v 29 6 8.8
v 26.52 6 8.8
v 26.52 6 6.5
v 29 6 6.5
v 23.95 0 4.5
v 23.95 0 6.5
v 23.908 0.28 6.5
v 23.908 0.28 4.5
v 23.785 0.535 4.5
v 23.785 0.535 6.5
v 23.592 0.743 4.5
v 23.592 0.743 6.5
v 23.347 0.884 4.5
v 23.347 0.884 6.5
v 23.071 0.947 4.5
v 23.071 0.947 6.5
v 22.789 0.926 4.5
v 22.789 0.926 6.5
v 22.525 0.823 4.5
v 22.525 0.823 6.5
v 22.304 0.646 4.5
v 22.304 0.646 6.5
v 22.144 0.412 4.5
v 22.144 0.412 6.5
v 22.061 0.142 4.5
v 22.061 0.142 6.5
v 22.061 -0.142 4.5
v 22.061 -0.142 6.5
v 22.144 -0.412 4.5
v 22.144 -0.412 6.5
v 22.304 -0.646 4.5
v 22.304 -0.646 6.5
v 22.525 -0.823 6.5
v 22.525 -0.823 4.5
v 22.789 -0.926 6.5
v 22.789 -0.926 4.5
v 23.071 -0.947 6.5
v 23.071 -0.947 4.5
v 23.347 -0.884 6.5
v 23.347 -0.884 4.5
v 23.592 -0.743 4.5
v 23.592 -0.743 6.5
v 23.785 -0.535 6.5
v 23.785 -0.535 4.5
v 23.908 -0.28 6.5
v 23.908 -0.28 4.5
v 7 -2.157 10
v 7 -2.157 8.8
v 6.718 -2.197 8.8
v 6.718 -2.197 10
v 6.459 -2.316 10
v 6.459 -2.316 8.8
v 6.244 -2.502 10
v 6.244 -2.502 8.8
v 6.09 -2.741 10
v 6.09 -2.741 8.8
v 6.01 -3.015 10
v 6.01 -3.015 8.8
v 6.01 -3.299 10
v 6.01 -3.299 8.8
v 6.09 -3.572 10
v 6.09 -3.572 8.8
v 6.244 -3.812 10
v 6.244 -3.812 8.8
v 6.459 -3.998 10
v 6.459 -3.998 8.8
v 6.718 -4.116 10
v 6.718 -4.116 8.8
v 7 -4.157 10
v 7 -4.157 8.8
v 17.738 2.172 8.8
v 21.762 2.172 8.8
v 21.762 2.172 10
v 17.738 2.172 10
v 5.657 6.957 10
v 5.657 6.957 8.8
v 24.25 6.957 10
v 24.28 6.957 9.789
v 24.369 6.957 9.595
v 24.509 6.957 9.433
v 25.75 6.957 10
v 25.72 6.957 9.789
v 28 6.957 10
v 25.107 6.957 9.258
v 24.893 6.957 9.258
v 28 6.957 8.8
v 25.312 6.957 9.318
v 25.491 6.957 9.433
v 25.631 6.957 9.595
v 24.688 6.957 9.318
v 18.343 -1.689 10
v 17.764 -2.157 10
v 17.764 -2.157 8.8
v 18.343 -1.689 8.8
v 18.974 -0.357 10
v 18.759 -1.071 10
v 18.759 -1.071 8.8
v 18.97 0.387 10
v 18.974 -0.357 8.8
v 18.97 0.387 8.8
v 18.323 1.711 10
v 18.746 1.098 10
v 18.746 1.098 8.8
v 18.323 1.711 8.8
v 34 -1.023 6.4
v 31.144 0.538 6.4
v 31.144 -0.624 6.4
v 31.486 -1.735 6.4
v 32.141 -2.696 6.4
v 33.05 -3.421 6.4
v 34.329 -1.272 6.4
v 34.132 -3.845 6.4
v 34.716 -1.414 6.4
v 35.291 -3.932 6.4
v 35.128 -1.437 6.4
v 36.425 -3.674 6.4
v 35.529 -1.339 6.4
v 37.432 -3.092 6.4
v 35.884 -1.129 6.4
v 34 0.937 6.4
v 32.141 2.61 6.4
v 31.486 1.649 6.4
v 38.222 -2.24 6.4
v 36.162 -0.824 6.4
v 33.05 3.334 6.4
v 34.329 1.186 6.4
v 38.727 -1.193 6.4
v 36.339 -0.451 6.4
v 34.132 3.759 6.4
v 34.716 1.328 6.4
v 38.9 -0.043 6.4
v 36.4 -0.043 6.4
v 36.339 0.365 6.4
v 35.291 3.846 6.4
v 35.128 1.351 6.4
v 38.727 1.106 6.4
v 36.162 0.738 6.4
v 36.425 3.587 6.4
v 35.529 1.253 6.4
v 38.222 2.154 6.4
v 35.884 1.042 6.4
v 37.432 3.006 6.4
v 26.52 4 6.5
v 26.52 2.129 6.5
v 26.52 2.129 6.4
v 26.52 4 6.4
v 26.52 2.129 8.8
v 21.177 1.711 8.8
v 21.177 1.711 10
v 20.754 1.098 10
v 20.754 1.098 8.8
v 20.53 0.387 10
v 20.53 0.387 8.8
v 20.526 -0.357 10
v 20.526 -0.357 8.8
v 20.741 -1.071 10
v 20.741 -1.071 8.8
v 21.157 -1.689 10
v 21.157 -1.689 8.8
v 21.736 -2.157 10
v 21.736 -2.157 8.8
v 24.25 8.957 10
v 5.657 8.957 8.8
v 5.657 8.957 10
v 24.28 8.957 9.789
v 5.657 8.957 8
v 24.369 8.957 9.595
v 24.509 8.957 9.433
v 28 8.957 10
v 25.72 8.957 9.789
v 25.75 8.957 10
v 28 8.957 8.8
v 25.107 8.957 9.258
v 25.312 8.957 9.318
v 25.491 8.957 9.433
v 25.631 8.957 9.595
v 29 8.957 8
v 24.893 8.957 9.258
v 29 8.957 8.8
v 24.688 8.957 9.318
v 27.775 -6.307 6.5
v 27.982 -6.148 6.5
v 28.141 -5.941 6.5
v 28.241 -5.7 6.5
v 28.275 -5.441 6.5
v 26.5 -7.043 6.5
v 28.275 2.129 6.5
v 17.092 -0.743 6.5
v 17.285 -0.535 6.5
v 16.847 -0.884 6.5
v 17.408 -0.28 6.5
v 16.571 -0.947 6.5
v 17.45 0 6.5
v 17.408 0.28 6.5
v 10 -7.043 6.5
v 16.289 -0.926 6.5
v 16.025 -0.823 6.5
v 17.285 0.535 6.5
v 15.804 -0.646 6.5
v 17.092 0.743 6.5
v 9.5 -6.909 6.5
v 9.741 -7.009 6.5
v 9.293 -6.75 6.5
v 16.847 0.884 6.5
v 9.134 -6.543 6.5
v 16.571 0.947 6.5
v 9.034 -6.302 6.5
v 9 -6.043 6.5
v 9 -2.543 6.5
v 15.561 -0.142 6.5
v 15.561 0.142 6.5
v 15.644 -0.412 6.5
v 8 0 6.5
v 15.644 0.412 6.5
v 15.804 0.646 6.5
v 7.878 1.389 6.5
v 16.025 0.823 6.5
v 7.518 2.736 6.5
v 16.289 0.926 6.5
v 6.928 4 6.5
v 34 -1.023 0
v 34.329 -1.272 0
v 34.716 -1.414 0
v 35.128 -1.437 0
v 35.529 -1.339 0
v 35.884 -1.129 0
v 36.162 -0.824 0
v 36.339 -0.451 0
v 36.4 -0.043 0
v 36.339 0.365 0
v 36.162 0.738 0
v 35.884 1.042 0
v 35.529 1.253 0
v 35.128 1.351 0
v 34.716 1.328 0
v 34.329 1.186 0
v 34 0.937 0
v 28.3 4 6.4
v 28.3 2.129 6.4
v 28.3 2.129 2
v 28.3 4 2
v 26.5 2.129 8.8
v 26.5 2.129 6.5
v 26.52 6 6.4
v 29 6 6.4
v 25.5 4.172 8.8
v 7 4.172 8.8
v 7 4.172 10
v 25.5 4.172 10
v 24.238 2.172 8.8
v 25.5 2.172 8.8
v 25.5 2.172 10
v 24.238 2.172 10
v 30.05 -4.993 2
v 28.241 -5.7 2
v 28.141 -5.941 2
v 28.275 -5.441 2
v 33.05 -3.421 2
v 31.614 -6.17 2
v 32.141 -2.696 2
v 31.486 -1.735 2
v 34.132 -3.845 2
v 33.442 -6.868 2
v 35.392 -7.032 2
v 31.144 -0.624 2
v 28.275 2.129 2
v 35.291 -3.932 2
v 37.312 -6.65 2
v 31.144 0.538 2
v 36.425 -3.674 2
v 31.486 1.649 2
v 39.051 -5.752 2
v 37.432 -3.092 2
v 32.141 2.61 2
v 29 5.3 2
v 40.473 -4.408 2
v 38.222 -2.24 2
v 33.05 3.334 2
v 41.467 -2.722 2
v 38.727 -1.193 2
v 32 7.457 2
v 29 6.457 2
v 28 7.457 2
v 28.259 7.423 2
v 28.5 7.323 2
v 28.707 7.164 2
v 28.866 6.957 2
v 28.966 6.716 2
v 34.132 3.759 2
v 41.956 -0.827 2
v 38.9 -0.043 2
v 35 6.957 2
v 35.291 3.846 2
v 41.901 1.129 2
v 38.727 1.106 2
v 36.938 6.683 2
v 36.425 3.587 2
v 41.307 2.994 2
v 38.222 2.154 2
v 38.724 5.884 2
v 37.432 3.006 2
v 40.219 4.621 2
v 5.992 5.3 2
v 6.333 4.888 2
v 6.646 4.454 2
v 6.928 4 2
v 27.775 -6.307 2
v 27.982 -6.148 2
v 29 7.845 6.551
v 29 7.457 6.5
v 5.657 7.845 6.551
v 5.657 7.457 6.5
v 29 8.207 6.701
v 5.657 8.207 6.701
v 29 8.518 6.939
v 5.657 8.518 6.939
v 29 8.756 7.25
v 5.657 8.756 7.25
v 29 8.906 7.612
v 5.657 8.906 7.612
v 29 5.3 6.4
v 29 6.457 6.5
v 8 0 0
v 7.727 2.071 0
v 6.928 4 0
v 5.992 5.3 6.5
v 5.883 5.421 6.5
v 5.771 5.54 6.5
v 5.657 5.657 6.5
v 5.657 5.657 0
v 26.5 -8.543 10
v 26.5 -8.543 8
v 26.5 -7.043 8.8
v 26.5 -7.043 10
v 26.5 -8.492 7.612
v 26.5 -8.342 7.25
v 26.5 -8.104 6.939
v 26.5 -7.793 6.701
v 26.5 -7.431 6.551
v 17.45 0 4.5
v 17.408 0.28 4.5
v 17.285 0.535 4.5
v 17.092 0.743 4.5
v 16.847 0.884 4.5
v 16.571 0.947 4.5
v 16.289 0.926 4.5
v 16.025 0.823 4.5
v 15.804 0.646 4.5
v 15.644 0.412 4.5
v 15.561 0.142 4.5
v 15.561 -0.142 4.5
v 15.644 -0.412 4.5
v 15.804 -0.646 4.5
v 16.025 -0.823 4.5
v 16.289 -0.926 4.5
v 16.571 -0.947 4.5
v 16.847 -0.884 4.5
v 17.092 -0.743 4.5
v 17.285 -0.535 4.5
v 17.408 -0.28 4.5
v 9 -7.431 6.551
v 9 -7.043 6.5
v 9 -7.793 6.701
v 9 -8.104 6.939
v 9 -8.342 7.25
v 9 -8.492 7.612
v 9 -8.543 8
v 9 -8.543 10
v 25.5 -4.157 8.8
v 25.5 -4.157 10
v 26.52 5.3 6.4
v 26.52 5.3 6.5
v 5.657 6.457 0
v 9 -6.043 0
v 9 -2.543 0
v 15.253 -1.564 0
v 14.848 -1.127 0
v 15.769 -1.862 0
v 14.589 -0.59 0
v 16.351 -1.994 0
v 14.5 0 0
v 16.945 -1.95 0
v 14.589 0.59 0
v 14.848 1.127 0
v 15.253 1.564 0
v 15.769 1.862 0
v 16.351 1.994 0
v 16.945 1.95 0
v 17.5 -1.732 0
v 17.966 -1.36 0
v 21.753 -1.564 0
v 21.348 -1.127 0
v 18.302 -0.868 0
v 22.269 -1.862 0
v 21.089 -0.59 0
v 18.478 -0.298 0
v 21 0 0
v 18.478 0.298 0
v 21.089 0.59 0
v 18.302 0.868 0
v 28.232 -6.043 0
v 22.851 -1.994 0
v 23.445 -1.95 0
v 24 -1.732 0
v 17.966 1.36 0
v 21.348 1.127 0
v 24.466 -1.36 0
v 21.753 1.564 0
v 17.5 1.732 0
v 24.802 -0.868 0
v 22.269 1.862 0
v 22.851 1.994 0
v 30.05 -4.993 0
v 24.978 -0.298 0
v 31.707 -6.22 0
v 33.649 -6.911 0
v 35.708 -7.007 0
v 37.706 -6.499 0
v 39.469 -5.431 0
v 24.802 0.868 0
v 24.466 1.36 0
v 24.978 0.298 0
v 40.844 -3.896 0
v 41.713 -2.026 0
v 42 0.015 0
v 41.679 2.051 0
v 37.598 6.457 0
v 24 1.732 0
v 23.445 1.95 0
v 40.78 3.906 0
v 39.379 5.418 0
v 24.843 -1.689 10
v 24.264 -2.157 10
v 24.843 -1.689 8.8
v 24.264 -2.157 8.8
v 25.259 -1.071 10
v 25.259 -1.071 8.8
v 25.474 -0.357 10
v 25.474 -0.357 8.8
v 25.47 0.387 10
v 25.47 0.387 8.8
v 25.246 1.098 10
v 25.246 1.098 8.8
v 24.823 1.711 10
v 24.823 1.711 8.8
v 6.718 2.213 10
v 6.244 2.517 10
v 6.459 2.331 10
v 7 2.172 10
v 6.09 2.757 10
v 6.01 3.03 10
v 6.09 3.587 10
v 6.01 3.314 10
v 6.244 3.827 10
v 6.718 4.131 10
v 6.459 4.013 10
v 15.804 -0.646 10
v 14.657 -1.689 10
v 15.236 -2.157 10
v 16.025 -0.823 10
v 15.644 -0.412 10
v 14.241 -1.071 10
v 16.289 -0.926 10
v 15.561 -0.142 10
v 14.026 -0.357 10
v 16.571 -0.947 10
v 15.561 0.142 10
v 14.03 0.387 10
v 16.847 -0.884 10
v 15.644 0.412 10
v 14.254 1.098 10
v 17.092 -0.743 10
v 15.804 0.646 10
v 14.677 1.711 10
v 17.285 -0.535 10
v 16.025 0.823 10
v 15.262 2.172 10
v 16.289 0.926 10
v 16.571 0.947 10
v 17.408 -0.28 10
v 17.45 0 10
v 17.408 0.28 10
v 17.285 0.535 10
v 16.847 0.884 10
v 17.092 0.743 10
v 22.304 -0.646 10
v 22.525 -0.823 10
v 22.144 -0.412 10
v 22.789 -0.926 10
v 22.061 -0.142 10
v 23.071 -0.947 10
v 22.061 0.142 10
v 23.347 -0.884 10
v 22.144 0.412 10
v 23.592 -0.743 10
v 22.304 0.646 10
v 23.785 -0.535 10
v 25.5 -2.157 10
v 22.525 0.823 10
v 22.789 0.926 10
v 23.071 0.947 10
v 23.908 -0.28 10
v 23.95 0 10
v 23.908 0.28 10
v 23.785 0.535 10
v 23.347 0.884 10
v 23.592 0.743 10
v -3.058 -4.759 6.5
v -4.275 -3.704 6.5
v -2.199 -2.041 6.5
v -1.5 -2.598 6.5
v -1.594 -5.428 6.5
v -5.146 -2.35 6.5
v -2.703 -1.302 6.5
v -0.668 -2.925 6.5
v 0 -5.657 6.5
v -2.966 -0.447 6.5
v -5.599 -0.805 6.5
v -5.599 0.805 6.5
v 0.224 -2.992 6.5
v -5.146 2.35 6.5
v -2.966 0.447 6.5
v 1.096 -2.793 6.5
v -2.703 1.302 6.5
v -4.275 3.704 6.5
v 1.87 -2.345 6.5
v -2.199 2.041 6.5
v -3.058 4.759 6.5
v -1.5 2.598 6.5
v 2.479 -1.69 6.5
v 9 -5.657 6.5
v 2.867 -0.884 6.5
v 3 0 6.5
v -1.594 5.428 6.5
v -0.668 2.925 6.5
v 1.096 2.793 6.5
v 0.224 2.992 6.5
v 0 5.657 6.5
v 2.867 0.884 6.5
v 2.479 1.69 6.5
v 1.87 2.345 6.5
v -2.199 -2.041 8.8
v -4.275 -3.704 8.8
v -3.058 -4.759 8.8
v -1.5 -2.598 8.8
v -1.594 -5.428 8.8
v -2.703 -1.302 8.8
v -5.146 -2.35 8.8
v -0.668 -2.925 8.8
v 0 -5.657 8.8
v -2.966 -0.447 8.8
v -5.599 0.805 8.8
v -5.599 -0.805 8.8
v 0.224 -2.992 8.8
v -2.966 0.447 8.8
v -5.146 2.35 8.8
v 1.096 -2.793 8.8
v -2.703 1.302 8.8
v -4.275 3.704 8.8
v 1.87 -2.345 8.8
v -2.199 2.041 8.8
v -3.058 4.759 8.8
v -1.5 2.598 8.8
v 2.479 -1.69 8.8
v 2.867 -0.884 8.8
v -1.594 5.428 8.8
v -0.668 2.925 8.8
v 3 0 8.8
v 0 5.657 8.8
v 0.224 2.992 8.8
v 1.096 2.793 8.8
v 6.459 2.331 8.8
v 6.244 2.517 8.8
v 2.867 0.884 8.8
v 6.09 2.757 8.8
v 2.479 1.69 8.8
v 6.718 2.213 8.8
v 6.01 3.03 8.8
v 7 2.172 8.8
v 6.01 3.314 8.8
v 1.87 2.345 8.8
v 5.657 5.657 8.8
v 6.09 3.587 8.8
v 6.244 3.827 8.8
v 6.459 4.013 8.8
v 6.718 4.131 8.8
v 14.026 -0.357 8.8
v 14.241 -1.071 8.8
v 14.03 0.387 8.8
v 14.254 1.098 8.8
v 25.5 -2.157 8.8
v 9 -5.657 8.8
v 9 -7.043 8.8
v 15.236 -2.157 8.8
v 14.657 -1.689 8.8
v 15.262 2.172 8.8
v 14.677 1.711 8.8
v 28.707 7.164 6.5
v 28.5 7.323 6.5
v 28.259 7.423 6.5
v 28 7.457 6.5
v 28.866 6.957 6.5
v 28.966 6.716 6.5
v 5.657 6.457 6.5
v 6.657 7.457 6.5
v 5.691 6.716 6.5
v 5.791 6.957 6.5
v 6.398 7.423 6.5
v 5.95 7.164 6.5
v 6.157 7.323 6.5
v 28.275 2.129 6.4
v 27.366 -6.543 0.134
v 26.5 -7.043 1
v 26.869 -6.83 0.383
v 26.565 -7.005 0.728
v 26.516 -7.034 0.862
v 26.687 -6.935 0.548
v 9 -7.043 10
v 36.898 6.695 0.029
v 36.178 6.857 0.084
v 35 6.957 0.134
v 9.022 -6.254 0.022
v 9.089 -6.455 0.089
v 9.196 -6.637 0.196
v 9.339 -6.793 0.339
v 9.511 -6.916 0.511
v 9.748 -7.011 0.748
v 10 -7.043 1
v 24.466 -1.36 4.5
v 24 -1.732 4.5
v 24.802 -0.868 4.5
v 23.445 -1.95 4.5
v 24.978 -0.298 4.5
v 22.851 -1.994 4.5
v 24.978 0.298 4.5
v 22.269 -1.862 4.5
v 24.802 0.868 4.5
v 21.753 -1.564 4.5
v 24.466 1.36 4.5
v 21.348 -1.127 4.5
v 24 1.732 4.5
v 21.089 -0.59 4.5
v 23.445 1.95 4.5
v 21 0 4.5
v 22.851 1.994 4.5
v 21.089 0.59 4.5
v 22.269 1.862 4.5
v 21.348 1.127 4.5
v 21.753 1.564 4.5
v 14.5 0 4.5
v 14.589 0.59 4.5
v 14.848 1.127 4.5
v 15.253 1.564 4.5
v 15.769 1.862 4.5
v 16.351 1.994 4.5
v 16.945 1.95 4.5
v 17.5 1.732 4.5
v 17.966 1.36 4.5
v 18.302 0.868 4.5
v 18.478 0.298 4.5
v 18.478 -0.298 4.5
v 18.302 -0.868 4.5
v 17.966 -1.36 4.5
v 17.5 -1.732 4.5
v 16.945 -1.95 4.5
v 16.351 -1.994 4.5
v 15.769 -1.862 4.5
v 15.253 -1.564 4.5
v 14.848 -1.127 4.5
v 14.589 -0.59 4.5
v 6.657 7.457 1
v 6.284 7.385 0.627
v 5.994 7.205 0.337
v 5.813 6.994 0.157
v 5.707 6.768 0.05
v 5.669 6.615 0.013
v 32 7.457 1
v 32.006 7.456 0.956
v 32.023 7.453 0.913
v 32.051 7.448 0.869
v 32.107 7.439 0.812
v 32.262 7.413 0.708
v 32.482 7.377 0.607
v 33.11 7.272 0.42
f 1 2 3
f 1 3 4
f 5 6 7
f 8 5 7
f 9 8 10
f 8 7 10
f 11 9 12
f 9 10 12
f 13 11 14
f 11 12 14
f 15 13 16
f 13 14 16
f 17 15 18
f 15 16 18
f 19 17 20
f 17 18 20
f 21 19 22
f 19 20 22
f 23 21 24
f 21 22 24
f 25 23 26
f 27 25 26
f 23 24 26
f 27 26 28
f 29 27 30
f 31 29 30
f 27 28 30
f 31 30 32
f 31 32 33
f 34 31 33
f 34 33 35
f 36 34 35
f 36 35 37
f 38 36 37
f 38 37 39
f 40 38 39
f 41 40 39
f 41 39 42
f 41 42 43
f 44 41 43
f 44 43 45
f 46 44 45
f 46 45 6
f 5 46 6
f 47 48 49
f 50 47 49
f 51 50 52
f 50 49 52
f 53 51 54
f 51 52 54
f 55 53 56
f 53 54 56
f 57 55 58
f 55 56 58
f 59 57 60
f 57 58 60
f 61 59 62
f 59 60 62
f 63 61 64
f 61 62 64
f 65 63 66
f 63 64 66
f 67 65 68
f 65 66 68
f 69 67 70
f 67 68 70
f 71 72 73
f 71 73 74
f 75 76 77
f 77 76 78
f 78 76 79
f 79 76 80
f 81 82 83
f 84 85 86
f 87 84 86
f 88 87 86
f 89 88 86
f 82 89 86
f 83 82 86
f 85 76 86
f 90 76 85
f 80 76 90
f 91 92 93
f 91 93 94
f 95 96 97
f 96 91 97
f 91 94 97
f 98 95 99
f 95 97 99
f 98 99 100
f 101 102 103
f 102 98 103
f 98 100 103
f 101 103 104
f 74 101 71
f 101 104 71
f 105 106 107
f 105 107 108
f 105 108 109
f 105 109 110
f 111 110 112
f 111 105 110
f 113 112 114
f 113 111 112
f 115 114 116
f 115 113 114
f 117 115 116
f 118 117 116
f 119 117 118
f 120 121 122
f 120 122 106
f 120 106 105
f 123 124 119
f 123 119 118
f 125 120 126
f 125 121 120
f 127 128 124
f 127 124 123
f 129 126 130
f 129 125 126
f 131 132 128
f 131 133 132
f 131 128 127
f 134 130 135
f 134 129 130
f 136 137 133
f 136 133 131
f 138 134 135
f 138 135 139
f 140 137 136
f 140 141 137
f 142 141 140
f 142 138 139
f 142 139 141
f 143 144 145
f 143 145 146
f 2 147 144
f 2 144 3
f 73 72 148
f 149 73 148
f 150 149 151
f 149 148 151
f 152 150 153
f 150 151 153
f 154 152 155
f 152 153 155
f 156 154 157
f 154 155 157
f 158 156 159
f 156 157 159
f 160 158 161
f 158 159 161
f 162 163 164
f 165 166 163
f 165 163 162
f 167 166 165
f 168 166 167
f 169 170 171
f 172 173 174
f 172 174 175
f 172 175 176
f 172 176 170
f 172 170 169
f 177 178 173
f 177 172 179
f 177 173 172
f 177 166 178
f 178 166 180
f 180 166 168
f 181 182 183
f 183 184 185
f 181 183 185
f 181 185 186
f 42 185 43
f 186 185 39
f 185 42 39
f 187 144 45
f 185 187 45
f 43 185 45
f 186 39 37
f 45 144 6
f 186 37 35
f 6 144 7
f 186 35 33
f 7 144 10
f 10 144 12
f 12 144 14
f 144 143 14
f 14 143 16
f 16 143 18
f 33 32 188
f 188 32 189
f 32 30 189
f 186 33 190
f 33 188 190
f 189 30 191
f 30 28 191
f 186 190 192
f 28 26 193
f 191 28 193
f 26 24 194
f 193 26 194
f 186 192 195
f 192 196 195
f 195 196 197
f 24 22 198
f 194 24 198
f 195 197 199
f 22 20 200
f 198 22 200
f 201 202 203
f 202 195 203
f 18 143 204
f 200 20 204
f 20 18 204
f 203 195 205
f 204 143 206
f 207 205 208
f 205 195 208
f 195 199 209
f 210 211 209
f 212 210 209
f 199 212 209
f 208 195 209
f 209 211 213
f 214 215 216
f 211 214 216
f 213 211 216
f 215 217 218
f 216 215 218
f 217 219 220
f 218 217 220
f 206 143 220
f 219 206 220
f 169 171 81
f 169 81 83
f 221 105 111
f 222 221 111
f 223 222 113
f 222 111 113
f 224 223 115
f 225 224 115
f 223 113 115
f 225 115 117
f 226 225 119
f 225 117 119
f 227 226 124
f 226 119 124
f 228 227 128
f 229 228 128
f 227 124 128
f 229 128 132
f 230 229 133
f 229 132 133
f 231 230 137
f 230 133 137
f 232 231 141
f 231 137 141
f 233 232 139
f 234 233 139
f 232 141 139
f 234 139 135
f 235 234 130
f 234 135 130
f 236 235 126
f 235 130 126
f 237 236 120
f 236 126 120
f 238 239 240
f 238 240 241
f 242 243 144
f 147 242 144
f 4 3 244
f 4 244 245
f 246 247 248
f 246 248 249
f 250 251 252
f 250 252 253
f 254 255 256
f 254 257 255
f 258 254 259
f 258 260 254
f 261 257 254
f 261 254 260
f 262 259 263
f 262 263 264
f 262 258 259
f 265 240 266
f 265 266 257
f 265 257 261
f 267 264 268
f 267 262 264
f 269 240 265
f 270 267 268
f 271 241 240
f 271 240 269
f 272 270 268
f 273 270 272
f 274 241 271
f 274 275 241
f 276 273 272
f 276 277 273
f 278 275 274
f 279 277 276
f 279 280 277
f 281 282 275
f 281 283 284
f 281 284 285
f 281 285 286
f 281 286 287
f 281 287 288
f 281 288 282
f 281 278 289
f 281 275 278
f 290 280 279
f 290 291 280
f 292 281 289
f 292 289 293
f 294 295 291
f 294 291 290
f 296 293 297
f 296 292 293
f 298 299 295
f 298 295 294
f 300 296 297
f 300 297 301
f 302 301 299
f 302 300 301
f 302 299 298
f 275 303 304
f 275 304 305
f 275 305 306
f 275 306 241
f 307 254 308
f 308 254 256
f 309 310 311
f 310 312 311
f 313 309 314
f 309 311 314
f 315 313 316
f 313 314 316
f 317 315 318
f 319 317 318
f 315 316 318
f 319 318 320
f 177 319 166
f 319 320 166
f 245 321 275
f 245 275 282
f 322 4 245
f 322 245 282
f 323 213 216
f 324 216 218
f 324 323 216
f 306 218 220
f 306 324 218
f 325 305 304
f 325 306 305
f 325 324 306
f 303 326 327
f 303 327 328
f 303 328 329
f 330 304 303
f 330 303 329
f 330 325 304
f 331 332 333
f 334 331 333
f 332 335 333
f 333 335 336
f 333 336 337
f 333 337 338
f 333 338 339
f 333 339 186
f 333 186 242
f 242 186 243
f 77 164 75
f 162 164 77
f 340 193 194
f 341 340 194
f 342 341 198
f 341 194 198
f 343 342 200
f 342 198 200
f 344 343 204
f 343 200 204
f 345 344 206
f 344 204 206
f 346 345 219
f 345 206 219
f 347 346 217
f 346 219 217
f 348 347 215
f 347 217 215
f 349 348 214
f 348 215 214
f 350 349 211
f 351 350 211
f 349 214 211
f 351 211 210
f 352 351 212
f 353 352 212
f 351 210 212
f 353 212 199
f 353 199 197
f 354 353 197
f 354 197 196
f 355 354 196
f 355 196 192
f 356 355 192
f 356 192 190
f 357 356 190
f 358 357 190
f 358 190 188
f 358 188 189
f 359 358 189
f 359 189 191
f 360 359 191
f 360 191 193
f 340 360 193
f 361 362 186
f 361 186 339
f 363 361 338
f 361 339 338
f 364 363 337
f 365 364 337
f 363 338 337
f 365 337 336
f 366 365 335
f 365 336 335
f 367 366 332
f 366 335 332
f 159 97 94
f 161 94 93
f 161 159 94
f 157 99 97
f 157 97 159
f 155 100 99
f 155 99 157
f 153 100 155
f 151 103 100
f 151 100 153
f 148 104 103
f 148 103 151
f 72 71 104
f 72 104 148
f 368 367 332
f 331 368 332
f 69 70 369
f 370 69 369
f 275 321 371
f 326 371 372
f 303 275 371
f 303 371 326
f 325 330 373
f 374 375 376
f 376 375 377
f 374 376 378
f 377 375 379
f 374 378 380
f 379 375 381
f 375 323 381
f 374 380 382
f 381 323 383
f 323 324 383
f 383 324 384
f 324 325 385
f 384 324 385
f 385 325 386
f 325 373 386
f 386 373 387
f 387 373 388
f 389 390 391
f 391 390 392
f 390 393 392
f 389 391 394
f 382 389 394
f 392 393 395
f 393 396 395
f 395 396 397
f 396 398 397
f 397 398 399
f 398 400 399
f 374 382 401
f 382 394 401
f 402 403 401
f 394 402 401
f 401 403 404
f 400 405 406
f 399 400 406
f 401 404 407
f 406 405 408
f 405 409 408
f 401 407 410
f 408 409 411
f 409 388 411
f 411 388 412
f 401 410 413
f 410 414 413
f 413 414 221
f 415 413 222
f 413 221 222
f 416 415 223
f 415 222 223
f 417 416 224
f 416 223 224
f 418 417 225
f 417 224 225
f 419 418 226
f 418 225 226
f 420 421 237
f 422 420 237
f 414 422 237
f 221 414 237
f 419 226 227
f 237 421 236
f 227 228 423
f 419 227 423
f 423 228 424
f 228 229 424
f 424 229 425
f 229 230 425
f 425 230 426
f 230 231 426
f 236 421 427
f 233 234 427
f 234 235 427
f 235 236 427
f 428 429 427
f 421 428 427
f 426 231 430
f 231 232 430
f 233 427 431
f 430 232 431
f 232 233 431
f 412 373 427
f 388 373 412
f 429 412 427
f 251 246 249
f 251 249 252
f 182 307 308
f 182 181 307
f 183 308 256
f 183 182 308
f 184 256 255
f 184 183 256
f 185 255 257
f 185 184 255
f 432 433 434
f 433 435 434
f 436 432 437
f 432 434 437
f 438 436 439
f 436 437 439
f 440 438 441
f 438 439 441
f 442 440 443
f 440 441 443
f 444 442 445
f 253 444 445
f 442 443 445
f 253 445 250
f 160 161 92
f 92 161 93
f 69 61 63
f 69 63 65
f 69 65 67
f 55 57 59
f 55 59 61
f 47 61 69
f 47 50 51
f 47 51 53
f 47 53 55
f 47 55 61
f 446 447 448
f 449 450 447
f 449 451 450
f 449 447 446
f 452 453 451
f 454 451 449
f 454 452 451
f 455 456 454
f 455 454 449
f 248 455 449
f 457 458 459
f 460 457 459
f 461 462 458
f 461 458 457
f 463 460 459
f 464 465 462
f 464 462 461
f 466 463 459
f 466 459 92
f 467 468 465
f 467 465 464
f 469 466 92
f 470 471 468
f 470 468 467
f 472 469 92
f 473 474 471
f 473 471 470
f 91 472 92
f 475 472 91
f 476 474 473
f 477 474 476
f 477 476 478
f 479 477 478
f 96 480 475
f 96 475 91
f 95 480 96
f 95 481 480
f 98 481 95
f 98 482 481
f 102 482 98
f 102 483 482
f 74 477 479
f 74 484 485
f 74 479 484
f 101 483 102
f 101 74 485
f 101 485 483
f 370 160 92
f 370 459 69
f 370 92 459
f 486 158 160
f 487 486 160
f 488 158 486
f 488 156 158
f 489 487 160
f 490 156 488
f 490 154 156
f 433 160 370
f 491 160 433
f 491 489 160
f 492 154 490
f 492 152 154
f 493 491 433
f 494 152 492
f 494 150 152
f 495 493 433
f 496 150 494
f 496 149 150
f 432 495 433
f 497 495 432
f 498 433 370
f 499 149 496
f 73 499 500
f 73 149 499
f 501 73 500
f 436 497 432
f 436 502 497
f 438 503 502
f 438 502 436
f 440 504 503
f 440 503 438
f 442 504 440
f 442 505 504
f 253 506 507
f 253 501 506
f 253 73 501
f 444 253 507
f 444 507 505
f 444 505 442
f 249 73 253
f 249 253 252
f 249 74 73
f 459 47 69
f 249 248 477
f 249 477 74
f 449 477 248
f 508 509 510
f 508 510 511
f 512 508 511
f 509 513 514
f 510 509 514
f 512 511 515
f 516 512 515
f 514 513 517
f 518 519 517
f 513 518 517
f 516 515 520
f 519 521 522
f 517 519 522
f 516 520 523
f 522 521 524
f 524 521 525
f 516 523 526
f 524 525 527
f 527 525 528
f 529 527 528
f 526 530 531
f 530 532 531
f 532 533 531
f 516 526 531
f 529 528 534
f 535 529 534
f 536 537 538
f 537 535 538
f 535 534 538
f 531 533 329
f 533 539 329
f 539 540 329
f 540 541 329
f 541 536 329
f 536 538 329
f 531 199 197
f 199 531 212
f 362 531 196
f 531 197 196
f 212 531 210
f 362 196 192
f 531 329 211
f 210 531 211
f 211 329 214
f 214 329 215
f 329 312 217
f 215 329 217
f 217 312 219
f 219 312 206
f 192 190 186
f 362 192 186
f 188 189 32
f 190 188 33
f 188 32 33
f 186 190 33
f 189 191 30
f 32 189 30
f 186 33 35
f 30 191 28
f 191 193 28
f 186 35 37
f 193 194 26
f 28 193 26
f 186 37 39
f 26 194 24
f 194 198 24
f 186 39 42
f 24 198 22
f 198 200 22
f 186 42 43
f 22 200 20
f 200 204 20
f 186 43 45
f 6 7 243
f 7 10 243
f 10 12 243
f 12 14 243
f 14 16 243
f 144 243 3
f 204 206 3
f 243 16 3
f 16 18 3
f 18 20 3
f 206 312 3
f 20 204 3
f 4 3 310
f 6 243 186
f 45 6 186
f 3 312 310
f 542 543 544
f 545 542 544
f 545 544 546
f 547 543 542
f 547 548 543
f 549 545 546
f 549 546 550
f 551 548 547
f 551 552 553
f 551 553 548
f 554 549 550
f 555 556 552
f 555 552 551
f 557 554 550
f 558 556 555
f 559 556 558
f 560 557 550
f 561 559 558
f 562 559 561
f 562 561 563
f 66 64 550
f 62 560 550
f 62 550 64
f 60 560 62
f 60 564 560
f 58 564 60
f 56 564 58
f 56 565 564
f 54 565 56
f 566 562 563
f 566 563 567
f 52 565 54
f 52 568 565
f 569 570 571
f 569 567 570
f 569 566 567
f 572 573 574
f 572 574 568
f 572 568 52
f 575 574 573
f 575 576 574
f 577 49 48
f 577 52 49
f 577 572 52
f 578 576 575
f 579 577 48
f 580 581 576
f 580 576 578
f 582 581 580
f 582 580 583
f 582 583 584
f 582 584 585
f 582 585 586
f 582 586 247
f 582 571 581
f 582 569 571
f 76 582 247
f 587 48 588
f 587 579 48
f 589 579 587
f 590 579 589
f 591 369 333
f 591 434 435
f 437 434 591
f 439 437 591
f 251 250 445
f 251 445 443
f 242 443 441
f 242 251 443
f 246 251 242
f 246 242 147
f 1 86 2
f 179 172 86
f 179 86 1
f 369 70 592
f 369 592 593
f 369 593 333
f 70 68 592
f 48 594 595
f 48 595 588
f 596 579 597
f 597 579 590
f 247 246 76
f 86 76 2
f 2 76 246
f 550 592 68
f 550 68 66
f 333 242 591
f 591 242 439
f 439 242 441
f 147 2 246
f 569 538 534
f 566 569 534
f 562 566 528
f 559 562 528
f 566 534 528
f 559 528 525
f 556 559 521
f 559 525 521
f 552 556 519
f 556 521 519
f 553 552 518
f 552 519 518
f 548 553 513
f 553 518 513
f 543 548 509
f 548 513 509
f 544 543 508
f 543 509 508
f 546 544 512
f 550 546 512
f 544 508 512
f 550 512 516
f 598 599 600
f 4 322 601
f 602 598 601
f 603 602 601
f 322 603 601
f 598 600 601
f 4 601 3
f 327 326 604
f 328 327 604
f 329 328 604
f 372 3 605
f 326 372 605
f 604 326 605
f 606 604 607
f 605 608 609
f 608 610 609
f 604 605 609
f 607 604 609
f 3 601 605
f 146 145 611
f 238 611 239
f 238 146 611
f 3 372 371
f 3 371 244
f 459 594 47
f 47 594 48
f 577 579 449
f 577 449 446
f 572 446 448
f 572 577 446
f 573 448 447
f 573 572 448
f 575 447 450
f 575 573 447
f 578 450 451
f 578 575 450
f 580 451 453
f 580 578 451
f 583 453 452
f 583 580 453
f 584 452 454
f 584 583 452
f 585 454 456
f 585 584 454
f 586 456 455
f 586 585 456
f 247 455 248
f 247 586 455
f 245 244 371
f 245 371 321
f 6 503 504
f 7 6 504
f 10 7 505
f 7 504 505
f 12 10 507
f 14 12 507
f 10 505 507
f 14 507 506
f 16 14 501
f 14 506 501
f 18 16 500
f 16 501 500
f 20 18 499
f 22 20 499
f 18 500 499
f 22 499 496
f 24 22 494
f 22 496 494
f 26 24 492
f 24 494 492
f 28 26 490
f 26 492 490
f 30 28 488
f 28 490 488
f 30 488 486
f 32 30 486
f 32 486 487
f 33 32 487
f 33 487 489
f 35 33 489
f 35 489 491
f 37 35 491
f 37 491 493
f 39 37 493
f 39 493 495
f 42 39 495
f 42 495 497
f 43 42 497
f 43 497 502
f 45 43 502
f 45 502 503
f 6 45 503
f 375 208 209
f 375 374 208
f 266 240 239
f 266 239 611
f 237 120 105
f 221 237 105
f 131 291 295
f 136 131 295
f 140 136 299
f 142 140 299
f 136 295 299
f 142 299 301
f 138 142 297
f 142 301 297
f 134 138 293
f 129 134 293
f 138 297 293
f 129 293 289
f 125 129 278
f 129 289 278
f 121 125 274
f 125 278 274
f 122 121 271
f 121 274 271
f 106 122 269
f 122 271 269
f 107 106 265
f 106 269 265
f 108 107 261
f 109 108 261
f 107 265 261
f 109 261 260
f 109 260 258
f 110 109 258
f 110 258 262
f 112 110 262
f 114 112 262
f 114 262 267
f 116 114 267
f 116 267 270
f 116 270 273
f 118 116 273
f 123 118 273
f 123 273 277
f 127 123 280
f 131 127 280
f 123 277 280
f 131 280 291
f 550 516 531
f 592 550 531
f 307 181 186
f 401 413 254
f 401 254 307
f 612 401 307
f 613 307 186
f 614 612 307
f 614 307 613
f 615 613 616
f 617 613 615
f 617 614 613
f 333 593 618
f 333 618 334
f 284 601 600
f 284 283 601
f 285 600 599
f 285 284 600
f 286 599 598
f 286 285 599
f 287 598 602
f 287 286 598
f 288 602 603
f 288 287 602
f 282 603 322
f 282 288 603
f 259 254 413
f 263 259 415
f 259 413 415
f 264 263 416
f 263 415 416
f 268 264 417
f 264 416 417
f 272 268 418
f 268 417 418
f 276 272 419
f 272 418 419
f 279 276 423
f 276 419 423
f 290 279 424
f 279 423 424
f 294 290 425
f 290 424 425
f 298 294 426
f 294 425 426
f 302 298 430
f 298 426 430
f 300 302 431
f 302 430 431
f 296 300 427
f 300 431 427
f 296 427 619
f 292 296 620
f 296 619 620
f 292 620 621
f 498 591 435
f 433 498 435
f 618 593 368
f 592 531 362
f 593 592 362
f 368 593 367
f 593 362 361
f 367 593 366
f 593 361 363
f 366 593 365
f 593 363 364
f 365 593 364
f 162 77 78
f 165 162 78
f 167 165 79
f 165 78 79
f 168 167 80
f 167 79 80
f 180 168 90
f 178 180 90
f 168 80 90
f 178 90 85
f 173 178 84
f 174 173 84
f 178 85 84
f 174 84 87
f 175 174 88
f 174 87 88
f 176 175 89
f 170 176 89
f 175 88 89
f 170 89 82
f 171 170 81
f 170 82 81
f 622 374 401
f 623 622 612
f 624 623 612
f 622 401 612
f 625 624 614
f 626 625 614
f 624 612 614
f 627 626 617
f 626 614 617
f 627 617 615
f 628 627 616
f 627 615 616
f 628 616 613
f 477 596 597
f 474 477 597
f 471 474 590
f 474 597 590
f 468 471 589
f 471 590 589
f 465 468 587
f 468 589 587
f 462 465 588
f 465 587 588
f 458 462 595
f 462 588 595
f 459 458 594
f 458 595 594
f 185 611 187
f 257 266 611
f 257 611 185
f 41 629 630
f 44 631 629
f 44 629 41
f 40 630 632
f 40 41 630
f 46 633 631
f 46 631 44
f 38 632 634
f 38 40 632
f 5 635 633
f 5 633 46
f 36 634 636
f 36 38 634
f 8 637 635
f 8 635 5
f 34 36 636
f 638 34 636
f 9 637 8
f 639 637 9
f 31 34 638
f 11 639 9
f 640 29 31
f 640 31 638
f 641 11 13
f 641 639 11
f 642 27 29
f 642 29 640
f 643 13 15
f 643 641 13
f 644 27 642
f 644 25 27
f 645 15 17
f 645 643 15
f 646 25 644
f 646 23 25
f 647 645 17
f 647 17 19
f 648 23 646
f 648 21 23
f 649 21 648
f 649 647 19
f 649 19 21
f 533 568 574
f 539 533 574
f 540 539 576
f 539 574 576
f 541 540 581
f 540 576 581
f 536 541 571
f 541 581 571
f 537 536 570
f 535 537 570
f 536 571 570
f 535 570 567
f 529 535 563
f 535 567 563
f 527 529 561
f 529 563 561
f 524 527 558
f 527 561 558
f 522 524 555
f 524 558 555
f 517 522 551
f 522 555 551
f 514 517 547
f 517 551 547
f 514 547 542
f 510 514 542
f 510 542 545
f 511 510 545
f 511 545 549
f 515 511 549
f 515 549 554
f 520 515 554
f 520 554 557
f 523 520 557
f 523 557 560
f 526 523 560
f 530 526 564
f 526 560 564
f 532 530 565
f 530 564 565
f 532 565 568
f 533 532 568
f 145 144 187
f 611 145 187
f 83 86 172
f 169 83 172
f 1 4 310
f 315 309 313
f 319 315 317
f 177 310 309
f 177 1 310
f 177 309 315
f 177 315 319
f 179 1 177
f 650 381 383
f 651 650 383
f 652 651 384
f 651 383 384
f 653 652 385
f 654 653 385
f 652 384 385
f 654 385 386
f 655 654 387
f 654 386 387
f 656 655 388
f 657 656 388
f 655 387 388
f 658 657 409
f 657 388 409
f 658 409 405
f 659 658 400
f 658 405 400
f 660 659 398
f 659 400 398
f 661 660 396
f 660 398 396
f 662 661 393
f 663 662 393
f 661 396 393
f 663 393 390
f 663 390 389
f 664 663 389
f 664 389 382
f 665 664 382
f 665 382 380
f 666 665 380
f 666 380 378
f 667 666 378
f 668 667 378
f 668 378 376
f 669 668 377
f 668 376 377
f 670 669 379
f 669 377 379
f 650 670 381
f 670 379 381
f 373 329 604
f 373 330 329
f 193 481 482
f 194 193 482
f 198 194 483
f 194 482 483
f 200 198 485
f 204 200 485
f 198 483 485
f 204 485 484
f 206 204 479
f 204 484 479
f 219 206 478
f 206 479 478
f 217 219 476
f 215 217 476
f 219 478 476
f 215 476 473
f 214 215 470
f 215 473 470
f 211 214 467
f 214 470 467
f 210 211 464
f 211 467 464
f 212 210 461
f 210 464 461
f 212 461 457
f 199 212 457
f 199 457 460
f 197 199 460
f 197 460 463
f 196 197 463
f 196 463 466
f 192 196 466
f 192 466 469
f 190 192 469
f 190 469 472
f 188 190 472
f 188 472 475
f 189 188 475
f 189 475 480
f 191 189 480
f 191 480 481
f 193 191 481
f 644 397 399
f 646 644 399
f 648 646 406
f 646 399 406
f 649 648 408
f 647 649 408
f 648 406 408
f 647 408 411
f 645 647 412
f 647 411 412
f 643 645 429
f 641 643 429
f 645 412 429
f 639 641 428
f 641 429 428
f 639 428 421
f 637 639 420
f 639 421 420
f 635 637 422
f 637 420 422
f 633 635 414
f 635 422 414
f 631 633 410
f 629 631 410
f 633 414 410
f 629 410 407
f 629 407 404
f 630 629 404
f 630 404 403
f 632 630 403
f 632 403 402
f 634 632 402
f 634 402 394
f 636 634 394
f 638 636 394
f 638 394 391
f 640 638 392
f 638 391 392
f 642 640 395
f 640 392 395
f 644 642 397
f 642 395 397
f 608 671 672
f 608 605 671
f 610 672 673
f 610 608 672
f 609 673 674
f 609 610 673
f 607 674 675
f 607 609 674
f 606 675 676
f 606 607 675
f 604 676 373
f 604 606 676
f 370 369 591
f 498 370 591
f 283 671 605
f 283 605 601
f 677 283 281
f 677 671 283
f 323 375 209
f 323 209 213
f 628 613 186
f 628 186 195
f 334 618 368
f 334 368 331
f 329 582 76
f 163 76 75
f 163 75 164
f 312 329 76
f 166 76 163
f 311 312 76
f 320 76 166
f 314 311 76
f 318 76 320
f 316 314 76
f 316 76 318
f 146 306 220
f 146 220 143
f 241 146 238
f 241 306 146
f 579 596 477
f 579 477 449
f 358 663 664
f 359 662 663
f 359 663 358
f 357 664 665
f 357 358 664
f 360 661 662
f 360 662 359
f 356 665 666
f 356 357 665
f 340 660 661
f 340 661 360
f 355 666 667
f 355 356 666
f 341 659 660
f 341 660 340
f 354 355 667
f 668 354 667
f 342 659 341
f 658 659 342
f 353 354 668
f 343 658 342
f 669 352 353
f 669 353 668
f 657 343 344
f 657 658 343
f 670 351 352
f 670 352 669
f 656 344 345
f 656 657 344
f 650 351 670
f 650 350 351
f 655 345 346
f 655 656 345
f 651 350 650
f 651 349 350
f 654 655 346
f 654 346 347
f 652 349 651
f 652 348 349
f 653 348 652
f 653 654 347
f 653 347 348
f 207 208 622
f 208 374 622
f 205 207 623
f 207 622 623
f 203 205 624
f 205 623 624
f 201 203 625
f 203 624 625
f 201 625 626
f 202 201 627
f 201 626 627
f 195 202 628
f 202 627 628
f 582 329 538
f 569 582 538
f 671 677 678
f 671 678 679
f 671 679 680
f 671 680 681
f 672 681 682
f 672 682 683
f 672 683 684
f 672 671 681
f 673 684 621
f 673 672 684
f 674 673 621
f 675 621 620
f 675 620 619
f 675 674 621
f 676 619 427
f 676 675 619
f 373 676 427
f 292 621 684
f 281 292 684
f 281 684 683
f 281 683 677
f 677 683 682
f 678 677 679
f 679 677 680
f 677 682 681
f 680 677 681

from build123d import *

# Parameters (mm, degrees)
BOSS_EXTRUDE1_DEPTH  = 2
BOSS_EXTRUDE6_DEPTH  = 4.5
CUT_EXTRUDE6_DEPTH   = 4.5
BOSS_EXTRUDE14_DEPTH = 2.3
SKETCH32_R           = 3
CUT_EXTRUDE7_DEPTH   = 2.3
SKETCH33_W           = 22.343119157
SKETCH33_H           = 2
SKETCH33_W_2         = 17.499973406
SKETCH33_H_2         = 1.5
BOSS_EXTRUDE15_DEPTH = 1.2
SKETCH35_W           = 5.479645996
SKETCH35_H           = 3.871139505
CUT_EXTRUDE8_DEPTH   = 2.4
SKETCH36_W           = 3.7
SKETCH36_H           = 1.871139505
CUT_EXTRUDE9_DEPTH   = 4.4
SKETCH37_R           = 3.9
BOSS_EXTRUDE16_DEPTH = 4.4
CUT_EXTRUDE10_DEPTH  = 7.4
SKETCH43_R           = 2.5
BOSS_EXTRUDE17_DEPTH = 1.2
SKETCH44_R           = 0.95
CUT_EXTRUDE11_DEPTH  = 11
SKETCH45_R           = 2
CUT_EXTRUDE12_DEPTH  = 4.5
SKETCH49_R           = 0.75
CUT_EXTRUDE13_DEPTH  = 3
SKETCH51_W           = 3
SKETCH51_H           = 3.965585241
CUT_EXTRUDE14_DEPTH  = 6.8
FILLET1_R            = 1.5
FILLET3_R            = 1


with BuildPart() as part:
    # Sketch3 → Boss-Extrude1 (new body)
    with BuildSketch(Plane.XY):
        with BuildLine():
            Line((8, 0), (9, -2.543145751))
            Line((9, -2.543145751), (9, -7.043145751))
            Line((9, -7.043145751), (26.499973406, -7.043145751))
            Line((26.499973406, -7.043145751), (30.050225938, -4.992893219))
            ThreePointArc((30.050225938, -4.992893219), (41.467130134, -2.721929777), (34.999973406, 6.956854249))
            Line((34.999973406, 6.956854249), (31.999973406, 7.456854249))
            Line((31.999973406, 7.456854249), (5.656854249, 7.456854249))
            Line((5.656854249, 7.456854249), (5.656854249, 5.656854249))
            ThreePointArc((5.656854249, 5.656854249), (7.39103626, 3.061467459), (8, 0))
        make_face()
    extrude(amount=BOSS_EXTRUDE1_DEPTH)

    # Sketch22 → Boss-Extrude6 (add)
    with BuildSketch(Plane.XY.offset(2)):
        with BuildLine():
            Line((5.656854249, 7.456854249), (26.499973406, 7.456854249))
            Line((26.499973406, 7.456854249), (31.999973406, 7.456854249))
            Line((31.999973406, 7.456854249), (31.999973406, 2.128860495))
            Line((31.999973406, 2.128860495), (28.275099672, 2.128860495))
            Line((28.275099672, 2.128860495), (28.275099672, -6.018019485))
            Line((28.275099672, -6.018019485), (26.499973406, -7.043145751))
            Line((26.499973406, -7.043145751), (9, -7.043145751))
            Line((9, -7.043145751), (9, -2.543145751))
            Line((9, -2.543145751), (8, 0))
            ThreePointArc((8, 0), (7.39103626, 3.061467459), (5.656854249, 5.656854249))
            Line((5.656854249, 5.656854249), (5.656854249, 7.456854249))
        make_face()
    extrude(amount=BOSS_EXTRUDE6_DEPTH)

    # Sketch26 → Cut-Extrude6 (cut)
    with BuildSketch(Plane.XY.offset(2)):
        Polygon((18.098080448, 5.3), (2.530052458, 5.3), (2.530052458, 4), (18.098080448, 4), (31.999973406, 4), (31.999973406, 5.3), align=None)
    extrude(amount=CUT_EXTRUDE6_DEPTH, mode=Mode.SUBTRACT)


with BuildPart() as body_2:
    # Sketch31 → Boss-Extrude14 (new body)
    with BuildSketch(Plane.XY.offset(6.5)):
        with BuildLine():
            Line((2.432688066, 5.656854249), (0, 5.656854249))
            ThreePointArc((0, 5.656854249), (-5.656854249, 0), (0, -5.656854249))
            Line((0, -5.656854249), (9, -5.656854249))
            Line((9, -5.656854249), (9, -7.043145751))
            Line((9, -7.043145751), (9, -8.543145751))
            Line((9, -8.543145751), (26.499973406, -8.543145751))
            Line((26.499973406, -8.543145751), (26.499973406, -7.043145751))
            Line((26.499973406, -7.043145751), (26.499973406, 2.128860495))
            Line((26.499973406, 2.128860495), (28.275099672, 2.128860495))
            Line((28.275099672, 2.128860495), (31.999973406, 2.128860495))
            Line((31.999973406, 2.128860495), (31.999973406, 7.456854249))
            Line((31.999973406, 7.456854249), (31.999973406, 8.956854249))
            Line((31.999973406, 8.956854249), (5.656854249, 8.956854249))
            Line((5.656854249, 8.956854249), (5.656854249, 7.456854249))
            Line((5.656854249, 7.456854249), (5.656854249, 5.656854249))
            Line((5.656854249, 5.656854249), (2.432688066, 5.656854249))
        make_face()
    extrude(amount=BOSS_EXTRUDE14_DEPTH)

    # Sketch32 → Cut-Extrude7 (cut)
    with BuildSketch(Plane.XY.offset(8.8)):
        Circle(SKETCH32_R)
    extrude(amount=-CUT_EXTRUDE7_DEPTH, mode=Mode.SUBTRACT)

    # Sketch33 → Boss-Extrude15 (add)
    with BuildSketch(Plane.XY.offset(8.8)):
        with Locations((16.828413828, 7.956854249)):
            Rectangle(SKETCH33_W, SKETCH33_H)
        with Locations((17.749986703, -7.793145751)):
            Rectangle(SKETCH33_W_2, SKETCH33_H_2)
        with BuildLine():
            Line((7, -4.156854249), (25.499973406, -4.156854249))
            Line((25.499973406, -4.156854249), (25.499973406, -2.156854249))
            Line((25.499973406, -2.156854249), (7, -2.156854249))
            ThreePointArc((7, -2.156854249), (6, -3.156854249), (7, -4.156854249))
        make_face()
        with BuildLine():
            Line((25.499973406, 2.172006245), (7, 2.172006245))
            ThreePointArc((7, 2.172006245), (6, 3.172006245), (7, 4.172006245))
            Line((7, 4.172006245), (25.499973406, 4.172006245))
            Line((25.499973406, 4.172006245), (25.499973406, 2.172006245))
        make_face()
    extrude(amount=BOSS_EXTRUDE15_DEPTH)


with BuildPart() as cut_extrude8_tool:
    # Sketch35 → Cut-Extrude8 (new body)
    with BuildSketch(Plane.XY.offset(8.8)):
        with Locations((29.260150408, 4.064430247)):
            Rectangle(SKETCH35_W, SKETCH35_H)
    extrude(amount=-CUT_EXTRUDE8_DEPTH)


with BuildPart() as part_1:
    add(part.part)

    # Cut-Extrude8: cut by cut_extrude8_tool
    add(cut_extrude8_tool.part, mode=Mode.SUBTRACT)

    # Sketch36 → Cut-Extrude9 (cut)
    with BuildSketch(Plane.XY.offset(6.4)):
        with Locations((30.149973406, 3.064430247)):
            Rectangle(SKETCH36_W, SKETCH36_H)
    extrude(amount=-CUT_EXTRUDE9_DEPTH, mode=Mode.SUBTRACT)

    # Sketch37 → Boss-Extrude16 (add)
    with BuildSketch(Plane.XY.offset(2)):
        with Locations((34.999973406, -0.043145751)):
            Circle(SKETCH37_R)
    extrude(amount=BOSS_EXTRUDE16_DEPTH)

    # Sketch39 → Cut-Extrude10 (cut, through all)
    with BuildSketch(Plane.XY.offset(6.4)):
        with BuildLine():
            Line((33.999973406, 0.936650147), (33.999973406, -1.022941648))
            ThreePointArc((33.999973406, -1.022941648), (36.399973406, -0.043145751), (33.999973406, 0.936650147))
        make_face()
    extrude(amount=-CUT_EXTRUDE10_DEPTH, mode=Mode.SUBTRACT)


with BuildPart() as body_2_1:
    add(body_2.part)

    # Cut-Extrude8: cut by cut_extrude8_tool
    add(cut_extrude8_tool.part, mode=Mode.SUBTRACT)

    # Sketch43 → Boss-Extrude17 (add)
    with BuildSketch(Plane.XY.offset(8.8)):
        with Locations((16.5, 0)):
            Circle(SKETCH43_R)
        with Locations((23, 0)):
            Circle(SKETCH43_R)
    extrude(amount=BOSS_EXTRUDE17_DEPTH)


with BuildPart() as cut_extrude11_tool:
    # Sketch44 → Cut-Extrude11 (new body, through all)
    with BuildSketch(Plane.XY.offset(10)):
        with Locations((16.5, 0)):
            Circle(SKETCH44_R)
        with Locations((23, 0)):
            Circle(SKETCH44_R)
    extrude(amount=-CUT_EXTRUDE11_DEPTH)


with BuildPart() as part_2:
    add(part_1.part)

    # Cut-Extrude11: cut by cut_extrude11_tool
    add(cut_extrude11_tool.part, mode=Mode.SUBTRACT)

    # Sketch45 → Cut-Extrude12 (cut)
    with BuildSketch(Plane(origin=(0, 0, 0), x_dir=(-1, 0, 0), z_dir=(0, 0, -1))):
        with Locations((-16.5, 0)):
            Circle(SKETCH45_R)
        with Locations((-23, 0)):
            Circle(SKETCH45_R)
    extrude(amount=-CUT_EXTRUDE12_DEPTH, mode=Mode.SUBTRACT)


with BuildPart() as body_2_2:
    add(body_2_1.part)

    # Cut-Extrude11: cut by cut_extrude11_tool
    add(cut_extrude11_tool.part, mode=Mode.SUBTRACT)

    # Sketch49 → Cut-Extrude13 (cut)
    with BuildSketch(Plane.XZ.offset(-6.956854249)):
        with Locations((24.999973406, 10)):
            Circle(SKETCH49_R)
    extrude(amount=-CUT_EXTRUDE13_DEPTH, mode=Mode.SUBTRACT)


with BuildPart() as cut_extrude14_tool:
    # Sketch51 → Cut-Extrude14 (new body)
    with BuildSketch(Plane.XY.offset(8.8)):
        with Locations((30.499973406, 6.974061629)):
            Rectangle(SKETCH51_W, SKETCH51_H)
    extrude(amount=-CUT_EXTRUDE14_DEPTH)


with BuildPart() as part_3:
    add(part_2.part)

    # Cut-Extrude14: cut by cut_extrude14_tool
    add(cut_extrude14_tool.part, mode=Mode.SUBTRACT)

    # Fillet3
    fillet3_edges = [part_3.edges().sort_by_distance(p)[0] for p in [
        (28.275099672, -6.018019485, 4.25),
        (28.999973406, 7.456854249, 4.25),
        (9, -7.043145751, 3.25),
        (5.656854249, 7.456854249, 3.25),
        (17.749986703, -7.043145751, 0),
        (18.828413828, 7.456854249, 0),
    ]]
    fillet(fillet3_edges, radius=FILLET3_R)


with BuildPart() as body_2_3:
    add(body_2_2.part)

    # Cut-Extrude14: cut by cut_extrude14_tool
    add(cut_extrude14_tool.part, mode=Mode.SUBTRACT)

    # Fillet1
    fillet1_edges = [body_2_3.edges().sort_by_distance(p)[0] for p in [
        (17.328413828, 8.956854249, 6.5),
        (17.749986703, -8.543145751, 6.5),
    ]]
    fillet(fillet1_edges, radius=FILLET1_R)


solid = Compound([part_3.part, body_2_3.part])
